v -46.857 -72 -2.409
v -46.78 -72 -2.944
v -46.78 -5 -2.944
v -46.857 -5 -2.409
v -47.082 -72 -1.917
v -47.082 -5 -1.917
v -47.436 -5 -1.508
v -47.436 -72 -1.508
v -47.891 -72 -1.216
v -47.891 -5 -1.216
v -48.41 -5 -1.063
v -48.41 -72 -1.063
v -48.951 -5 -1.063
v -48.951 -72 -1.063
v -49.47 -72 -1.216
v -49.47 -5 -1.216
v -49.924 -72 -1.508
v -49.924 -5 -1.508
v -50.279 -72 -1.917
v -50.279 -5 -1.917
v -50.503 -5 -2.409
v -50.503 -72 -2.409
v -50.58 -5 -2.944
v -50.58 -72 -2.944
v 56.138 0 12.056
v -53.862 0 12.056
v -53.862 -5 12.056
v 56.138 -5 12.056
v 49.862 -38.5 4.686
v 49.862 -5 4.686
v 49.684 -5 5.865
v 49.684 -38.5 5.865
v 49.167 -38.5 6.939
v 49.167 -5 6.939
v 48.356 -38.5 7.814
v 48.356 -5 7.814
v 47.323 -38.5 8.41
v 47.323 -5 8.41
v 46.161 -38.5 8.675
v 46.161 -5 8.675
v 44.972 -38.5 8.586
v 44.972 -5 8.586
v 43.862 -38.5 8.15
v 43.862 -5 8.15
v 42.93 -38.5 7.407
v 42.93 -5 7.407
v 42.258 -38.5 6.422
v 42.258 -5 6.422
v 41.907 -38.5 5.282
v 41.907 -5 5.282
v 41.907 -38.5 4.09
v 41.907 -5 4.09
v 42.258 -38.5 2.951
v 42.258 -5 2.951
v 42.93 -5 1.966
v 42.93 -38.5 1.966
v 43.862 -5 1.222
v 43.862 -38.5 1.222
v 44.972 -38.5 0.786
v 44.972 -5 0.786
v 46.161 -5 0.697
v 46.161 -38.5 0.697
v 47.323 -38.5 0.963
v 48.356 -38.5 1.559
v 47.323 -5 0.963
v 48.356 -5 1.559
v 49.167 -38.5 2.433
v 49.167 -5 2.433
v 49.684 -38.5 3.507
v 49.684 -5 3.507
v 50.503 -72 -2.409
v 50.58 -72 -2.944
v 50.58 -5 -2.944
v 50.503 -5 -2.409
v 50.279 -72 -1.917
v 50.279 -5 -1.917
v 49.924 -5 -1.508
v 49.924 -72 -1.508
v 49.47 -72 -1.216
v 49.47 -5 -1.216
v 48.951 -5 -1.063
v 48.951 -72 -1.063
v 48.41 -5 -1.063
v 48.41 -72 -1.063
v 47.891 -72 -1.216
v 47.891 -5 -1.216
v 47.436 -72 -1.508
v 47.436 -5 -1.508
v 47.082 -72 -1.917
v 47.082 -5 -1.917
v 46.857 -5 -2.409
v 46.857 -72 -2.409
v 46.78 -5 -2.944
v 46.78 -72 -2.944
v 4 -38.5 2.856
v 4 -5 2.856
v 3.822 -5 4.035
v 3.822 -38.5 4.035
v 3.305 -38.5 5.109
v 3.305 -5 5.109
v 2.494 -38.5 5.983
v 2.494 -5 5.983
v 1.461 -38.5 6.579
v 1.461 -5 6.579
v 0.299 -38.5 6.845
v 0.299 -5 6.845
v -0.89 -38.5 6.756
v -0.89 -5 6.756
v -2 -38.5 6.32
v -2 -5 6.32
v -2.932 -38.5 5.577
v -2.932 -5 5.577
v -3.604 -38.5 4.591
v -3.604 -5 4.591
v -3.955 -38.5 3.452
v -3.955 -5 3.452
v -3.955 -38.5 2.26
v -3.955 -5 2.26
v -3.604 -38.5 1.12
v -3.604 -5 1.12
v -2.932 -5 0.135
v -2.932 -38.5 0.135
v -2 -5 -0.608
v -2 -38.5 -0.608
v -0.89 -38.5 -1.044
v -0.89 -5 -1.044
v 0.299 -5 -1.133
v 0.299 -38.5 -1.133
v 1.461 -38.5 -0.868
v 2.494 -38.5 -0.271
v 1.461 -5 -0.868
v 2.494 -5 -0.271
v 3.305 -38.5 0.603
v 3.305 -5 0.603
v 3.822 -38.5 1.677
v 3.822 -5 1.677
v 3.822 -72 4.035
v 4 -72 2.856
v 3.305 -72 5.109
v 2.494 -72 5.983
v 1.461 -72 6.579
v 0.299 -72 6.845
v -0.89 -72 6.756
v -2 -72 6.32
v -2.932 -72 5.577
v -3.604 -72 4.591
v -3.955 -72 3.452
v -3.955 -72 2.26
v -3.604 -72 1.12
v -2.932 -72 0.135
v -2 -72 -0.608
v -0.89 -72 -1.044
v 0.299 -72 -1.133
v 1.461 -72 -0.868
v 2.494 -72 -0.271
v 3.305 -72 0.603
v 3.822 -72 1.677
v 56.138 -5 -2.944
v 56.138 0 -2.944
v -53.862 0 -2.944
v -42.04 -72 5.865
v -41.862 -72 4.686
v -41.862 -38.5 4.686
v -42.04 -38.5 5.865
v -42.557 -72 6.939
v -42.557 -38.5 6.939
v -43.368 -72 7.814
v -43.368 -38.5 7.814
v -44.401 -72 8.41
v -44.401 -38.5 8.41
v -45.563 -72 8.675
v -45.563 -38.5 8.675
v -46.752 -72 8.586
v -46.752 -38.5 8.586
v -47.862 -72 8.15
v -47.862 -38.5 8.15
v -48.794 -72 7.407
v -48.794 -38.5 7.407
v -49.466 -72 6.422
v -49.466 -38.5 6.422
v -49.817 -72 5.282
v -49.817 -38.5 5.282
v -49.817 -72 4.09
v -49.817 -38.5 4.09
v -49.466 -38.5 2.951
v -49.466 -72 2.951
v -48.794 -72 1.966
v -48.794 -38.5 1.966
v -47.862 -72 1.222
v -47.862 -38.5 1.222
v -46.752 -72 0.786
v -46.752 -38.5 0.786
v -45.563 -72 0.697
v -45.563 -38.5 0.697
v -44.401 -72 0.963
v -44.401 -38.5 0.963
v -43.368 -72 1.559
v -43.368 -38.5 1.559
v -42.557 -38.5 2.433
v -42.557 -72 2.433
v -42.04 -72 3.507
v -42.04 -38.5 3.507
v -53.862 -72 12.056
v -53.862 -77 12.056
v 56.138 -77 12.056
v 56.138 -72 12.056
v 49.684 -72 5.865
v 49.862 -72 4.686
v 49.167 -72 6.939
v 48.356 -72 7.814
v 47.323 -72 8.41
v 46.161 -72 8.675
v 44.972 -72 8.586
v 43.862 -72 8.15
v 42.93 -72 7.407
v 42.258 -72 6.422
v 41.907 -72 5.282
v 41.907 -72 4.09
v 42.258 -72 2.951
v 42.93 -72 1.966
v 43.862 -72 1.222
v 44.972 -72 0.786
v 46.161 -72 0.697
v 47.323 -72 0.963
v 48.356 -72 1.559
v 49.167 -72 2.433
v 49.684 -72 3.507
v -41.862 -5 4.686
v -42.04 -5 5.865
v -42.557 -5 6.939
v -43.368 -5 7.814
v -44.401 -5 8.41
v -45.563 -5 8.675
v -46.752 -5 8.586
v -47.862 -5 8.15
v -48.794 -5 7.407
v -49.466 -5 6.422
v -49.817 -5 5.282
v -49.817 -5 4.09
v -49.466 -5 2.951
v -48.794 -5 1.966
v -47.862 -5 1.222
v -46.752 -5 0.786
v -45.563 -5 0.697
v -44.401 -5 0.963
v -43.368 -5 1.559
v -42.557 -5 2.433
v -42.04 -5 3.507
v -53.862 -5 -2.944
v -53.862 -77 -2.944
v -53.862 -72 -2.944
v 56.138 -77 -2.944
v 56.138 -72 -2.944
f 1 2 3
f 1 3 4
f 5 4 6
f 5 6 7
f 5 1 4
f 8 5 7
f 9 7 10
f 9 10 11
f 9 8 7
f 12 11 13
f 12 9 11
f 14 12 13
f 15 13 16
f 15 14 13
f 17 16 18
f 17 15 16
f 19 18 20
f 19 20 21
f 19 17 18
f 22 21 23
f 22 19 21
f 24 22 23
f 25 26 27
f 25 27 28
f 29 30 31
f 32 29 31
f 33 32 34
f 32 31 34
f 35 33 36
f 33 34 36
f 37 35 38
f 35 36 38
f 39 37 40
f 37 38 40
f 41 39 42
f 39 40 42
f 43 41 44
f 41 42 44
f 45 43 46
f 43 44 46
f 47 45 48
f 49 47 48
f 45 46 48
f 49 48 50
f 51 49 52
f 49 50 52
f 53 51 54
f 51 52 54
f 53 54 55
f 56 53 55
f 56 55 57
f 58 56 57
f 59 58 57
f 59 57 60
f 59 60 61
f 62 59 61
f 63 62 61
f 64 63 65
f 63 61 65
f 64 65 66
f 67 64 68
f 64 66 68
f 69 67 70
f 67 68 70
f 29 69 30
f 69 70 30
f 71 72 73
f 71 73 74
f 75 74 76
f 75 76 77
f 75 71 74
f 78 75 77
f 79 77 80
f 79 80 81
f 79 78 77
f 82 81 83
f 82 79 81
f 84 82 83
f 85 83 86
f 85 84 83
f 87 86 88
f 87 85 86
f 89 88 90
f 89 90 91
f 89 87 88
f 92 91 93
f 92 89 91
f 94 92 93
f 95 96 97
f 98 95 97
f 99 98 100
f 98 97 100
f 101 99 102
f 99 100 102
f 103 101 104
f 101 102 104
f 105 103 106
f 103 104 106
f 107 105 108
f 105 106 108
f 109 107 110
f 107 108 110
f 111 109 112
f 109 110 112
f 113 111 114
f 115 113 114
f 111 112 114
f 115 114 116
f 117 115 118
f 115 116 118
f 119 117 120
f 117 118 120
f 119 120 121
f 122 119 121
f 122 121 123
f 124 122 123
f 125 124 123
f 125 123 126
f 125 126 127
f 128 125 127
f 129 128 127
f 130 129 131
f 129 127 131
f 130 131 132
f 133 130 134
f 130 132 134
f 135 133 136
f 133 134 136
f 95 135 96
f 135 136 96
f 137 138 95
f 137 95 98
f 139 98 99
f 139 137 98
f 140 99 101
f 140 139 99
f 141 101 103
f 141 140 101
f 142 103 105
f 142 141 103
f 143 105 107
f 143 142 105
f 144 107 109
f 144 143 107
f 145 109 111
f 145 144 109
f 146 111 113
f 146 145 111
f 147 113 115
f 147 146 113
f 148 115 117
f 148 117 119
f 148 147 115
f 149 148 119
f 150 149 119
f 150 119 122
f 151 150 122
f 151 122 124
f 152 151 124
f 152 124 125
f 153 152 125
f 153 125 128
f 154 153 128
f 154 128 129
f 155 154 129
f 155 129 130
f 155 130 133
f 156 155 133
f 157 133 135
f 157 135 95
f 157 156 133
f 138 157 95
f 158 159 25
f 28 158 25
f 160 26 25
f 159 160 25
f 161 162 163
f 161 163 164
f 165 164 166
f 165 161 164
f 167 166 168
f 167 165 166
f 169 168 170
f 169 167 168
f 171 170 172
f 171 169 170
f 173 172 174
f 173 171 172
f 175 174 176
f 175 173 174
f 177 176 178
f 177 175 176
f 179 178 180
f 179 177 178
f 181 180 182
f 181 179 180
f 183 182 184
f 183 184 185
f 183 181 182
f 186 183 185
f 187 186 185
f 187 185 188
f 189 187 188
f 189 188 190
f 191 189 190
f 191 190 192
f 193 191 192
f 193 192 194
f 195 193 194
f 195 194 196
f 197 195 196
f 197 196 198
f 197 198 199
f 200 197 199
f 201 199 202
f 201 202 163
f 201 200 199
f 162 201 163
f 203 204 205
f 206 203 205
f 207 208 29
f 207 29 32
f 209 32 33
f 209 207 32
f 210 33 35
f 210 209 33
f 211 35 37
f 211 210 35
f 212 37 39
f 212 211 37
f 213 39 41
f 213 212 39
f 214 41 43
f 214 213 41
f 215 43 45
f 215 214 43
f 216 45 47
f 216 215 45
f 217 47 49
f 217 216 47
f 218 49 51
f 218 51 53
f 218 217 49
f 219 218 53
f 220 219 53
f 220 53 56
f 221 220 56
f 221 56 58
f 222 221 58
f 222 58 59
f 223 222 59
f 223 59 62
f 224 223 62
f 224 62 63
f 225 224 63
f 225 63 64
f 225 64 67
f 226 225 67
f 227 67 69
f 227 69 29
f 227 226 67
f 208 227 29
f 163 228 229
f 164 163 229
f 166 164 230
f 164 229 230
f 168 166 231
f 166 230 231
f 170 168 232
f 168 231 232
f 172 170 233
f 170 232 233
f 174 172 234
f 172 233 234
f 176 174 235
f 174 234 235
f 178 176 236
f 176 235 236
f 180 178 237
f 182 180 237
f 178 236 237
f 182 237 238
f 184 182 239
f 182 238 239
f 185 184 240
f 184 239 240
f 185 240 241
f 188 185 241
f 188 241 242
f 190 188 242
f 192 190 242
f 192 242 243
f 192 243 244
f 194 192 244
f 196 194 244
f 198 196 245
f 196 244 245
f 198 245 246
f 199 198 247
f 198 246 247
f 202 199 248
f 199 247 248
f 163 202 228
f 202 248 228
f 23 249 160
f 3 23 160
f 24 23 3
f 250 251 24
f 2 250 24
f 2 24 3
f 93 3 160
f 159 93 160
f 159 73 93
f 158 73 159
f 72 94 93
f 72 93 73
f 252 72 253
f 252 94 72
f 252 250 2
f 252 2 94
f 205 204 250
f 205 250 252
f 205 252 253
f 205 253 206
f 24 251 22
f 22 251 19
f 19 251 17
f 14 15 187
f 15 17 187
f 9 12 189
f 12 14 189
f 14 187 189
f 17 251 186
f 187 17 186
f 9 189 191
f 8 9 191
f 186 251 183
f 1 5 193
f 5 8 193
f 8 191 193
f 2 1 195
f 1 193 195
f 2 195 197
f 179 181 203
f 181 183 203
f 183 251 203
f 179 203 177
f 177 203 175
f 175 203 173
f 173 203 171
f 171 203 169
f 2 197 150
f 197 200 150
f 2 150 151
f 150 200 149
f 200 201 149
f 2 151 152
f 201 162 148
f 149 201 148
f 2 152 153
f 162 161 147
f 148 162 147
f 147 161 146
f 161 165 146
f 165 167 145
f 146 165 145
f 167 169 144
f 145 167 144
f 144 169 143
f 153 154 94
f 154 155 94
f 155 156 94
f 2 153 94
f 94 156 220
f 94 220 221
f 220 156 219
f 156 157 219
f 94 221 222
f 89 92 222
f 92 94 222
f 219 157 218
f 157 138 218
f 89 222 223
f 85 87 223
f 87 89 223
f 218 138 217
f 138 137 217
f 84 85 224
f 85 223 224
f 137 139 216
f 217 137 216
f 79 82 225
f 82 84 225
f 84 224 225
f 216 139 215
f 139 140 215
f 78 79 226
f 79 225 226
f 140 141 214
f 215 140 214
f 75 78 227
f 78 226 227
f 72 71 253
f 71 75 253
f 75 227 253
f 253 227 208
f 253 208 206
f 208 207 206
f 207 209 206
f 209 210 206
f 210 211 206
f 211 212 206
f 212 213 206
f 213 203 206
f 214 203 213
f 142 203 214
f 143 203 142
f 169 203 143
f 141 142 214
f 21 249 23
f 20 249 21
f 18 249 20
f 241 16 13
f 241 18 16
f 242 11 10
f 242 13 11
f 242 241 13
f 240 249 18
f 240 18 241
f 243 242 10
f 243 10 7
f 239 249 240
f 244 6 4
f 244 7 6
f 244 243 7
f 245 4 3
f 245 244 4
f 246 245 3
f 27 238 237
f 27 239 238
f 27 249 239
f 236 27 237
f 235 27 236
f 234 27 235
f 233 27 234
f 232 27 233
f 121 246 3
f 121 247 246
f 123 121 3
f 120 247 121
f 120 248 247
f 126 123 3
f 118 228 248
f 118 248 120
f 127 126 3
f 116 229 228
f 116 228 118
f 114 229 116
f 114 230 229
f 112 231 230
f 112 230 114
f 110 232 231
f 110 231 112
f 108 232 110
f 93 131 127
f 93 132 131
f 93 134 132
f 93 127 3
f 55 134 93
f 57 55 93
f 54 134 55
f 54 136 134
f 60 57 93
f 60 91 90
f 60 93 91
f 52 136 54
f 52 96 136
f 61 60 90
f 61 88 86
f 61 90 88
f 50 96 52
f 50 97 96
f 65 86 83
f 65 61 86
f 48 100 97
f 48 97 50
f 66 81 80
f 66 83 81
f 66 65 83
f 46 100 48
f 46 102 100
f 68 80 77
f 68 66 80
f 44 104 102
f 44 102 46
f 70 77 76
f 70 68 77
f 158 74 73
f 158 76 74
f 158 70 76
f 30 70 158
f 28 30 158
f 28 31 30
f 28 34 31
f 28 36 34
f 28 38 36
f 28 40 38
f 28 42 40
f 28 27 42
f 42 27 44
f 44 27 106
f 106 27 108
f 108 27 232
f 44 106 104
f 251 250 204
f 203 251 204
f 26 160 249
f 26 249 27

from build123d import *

# Parameters (mm, degrees)
F0_W     = 110
F0_H     = 15
F1_DEPTH = 5
F2_R     = 4
F3_DEPTH = 33.5


with BuildPart() as f1:
    # F0 (on Front) → F1 (new body)
    with BuildSketch(Plane.XZ):
        with Locations((1.137998, 4.555882)):
            Rectangle(F0_W, F0_H)
    extrude(amount=F1_DEPTH)

    # F2 (on face) → F3 (join)
    with BuildSketch(Plane.XZ.offset(5)):
        with Locations((0, 2.855882)):
            Circle(F2_R)
        with BuildLine():
            Line((-48.680253, -2.944118), (-46.780253, -2.944118))
            ThreePointArc((-46.780253, -2.944118), (-48.680253, -1.044118), (-50.580253, -2.944118))
            Line((-50.580253, -2.944118), (-48.680253, -2.944118))
        make_face()
        with Locations((-45.862002, 4.686209)):
            Circle(F2_R)
        with Locations((45.862002, 4.686209)):
            Circle(F2_R)
        with BuildLine():
            ThreePointArc((50.580253, -2.944118), (48.680253, -1.044118), (46.780253, -2.944118))
            Line((46.780253, -2.944118), (50.580253, -2.944118))
        make_face()
    extrude(amount=F3_DEPTH)

    # F4: F1 across face


with BuildPart() as f1_1:
    add(f1.part)
    add(f1.part.mirror(Plane(origin=(-45.862002, -38.5, 4.686209), x_dir=(1, 0, 0), z_dir=(0, -1, 0))))


solid = f1_1.part
